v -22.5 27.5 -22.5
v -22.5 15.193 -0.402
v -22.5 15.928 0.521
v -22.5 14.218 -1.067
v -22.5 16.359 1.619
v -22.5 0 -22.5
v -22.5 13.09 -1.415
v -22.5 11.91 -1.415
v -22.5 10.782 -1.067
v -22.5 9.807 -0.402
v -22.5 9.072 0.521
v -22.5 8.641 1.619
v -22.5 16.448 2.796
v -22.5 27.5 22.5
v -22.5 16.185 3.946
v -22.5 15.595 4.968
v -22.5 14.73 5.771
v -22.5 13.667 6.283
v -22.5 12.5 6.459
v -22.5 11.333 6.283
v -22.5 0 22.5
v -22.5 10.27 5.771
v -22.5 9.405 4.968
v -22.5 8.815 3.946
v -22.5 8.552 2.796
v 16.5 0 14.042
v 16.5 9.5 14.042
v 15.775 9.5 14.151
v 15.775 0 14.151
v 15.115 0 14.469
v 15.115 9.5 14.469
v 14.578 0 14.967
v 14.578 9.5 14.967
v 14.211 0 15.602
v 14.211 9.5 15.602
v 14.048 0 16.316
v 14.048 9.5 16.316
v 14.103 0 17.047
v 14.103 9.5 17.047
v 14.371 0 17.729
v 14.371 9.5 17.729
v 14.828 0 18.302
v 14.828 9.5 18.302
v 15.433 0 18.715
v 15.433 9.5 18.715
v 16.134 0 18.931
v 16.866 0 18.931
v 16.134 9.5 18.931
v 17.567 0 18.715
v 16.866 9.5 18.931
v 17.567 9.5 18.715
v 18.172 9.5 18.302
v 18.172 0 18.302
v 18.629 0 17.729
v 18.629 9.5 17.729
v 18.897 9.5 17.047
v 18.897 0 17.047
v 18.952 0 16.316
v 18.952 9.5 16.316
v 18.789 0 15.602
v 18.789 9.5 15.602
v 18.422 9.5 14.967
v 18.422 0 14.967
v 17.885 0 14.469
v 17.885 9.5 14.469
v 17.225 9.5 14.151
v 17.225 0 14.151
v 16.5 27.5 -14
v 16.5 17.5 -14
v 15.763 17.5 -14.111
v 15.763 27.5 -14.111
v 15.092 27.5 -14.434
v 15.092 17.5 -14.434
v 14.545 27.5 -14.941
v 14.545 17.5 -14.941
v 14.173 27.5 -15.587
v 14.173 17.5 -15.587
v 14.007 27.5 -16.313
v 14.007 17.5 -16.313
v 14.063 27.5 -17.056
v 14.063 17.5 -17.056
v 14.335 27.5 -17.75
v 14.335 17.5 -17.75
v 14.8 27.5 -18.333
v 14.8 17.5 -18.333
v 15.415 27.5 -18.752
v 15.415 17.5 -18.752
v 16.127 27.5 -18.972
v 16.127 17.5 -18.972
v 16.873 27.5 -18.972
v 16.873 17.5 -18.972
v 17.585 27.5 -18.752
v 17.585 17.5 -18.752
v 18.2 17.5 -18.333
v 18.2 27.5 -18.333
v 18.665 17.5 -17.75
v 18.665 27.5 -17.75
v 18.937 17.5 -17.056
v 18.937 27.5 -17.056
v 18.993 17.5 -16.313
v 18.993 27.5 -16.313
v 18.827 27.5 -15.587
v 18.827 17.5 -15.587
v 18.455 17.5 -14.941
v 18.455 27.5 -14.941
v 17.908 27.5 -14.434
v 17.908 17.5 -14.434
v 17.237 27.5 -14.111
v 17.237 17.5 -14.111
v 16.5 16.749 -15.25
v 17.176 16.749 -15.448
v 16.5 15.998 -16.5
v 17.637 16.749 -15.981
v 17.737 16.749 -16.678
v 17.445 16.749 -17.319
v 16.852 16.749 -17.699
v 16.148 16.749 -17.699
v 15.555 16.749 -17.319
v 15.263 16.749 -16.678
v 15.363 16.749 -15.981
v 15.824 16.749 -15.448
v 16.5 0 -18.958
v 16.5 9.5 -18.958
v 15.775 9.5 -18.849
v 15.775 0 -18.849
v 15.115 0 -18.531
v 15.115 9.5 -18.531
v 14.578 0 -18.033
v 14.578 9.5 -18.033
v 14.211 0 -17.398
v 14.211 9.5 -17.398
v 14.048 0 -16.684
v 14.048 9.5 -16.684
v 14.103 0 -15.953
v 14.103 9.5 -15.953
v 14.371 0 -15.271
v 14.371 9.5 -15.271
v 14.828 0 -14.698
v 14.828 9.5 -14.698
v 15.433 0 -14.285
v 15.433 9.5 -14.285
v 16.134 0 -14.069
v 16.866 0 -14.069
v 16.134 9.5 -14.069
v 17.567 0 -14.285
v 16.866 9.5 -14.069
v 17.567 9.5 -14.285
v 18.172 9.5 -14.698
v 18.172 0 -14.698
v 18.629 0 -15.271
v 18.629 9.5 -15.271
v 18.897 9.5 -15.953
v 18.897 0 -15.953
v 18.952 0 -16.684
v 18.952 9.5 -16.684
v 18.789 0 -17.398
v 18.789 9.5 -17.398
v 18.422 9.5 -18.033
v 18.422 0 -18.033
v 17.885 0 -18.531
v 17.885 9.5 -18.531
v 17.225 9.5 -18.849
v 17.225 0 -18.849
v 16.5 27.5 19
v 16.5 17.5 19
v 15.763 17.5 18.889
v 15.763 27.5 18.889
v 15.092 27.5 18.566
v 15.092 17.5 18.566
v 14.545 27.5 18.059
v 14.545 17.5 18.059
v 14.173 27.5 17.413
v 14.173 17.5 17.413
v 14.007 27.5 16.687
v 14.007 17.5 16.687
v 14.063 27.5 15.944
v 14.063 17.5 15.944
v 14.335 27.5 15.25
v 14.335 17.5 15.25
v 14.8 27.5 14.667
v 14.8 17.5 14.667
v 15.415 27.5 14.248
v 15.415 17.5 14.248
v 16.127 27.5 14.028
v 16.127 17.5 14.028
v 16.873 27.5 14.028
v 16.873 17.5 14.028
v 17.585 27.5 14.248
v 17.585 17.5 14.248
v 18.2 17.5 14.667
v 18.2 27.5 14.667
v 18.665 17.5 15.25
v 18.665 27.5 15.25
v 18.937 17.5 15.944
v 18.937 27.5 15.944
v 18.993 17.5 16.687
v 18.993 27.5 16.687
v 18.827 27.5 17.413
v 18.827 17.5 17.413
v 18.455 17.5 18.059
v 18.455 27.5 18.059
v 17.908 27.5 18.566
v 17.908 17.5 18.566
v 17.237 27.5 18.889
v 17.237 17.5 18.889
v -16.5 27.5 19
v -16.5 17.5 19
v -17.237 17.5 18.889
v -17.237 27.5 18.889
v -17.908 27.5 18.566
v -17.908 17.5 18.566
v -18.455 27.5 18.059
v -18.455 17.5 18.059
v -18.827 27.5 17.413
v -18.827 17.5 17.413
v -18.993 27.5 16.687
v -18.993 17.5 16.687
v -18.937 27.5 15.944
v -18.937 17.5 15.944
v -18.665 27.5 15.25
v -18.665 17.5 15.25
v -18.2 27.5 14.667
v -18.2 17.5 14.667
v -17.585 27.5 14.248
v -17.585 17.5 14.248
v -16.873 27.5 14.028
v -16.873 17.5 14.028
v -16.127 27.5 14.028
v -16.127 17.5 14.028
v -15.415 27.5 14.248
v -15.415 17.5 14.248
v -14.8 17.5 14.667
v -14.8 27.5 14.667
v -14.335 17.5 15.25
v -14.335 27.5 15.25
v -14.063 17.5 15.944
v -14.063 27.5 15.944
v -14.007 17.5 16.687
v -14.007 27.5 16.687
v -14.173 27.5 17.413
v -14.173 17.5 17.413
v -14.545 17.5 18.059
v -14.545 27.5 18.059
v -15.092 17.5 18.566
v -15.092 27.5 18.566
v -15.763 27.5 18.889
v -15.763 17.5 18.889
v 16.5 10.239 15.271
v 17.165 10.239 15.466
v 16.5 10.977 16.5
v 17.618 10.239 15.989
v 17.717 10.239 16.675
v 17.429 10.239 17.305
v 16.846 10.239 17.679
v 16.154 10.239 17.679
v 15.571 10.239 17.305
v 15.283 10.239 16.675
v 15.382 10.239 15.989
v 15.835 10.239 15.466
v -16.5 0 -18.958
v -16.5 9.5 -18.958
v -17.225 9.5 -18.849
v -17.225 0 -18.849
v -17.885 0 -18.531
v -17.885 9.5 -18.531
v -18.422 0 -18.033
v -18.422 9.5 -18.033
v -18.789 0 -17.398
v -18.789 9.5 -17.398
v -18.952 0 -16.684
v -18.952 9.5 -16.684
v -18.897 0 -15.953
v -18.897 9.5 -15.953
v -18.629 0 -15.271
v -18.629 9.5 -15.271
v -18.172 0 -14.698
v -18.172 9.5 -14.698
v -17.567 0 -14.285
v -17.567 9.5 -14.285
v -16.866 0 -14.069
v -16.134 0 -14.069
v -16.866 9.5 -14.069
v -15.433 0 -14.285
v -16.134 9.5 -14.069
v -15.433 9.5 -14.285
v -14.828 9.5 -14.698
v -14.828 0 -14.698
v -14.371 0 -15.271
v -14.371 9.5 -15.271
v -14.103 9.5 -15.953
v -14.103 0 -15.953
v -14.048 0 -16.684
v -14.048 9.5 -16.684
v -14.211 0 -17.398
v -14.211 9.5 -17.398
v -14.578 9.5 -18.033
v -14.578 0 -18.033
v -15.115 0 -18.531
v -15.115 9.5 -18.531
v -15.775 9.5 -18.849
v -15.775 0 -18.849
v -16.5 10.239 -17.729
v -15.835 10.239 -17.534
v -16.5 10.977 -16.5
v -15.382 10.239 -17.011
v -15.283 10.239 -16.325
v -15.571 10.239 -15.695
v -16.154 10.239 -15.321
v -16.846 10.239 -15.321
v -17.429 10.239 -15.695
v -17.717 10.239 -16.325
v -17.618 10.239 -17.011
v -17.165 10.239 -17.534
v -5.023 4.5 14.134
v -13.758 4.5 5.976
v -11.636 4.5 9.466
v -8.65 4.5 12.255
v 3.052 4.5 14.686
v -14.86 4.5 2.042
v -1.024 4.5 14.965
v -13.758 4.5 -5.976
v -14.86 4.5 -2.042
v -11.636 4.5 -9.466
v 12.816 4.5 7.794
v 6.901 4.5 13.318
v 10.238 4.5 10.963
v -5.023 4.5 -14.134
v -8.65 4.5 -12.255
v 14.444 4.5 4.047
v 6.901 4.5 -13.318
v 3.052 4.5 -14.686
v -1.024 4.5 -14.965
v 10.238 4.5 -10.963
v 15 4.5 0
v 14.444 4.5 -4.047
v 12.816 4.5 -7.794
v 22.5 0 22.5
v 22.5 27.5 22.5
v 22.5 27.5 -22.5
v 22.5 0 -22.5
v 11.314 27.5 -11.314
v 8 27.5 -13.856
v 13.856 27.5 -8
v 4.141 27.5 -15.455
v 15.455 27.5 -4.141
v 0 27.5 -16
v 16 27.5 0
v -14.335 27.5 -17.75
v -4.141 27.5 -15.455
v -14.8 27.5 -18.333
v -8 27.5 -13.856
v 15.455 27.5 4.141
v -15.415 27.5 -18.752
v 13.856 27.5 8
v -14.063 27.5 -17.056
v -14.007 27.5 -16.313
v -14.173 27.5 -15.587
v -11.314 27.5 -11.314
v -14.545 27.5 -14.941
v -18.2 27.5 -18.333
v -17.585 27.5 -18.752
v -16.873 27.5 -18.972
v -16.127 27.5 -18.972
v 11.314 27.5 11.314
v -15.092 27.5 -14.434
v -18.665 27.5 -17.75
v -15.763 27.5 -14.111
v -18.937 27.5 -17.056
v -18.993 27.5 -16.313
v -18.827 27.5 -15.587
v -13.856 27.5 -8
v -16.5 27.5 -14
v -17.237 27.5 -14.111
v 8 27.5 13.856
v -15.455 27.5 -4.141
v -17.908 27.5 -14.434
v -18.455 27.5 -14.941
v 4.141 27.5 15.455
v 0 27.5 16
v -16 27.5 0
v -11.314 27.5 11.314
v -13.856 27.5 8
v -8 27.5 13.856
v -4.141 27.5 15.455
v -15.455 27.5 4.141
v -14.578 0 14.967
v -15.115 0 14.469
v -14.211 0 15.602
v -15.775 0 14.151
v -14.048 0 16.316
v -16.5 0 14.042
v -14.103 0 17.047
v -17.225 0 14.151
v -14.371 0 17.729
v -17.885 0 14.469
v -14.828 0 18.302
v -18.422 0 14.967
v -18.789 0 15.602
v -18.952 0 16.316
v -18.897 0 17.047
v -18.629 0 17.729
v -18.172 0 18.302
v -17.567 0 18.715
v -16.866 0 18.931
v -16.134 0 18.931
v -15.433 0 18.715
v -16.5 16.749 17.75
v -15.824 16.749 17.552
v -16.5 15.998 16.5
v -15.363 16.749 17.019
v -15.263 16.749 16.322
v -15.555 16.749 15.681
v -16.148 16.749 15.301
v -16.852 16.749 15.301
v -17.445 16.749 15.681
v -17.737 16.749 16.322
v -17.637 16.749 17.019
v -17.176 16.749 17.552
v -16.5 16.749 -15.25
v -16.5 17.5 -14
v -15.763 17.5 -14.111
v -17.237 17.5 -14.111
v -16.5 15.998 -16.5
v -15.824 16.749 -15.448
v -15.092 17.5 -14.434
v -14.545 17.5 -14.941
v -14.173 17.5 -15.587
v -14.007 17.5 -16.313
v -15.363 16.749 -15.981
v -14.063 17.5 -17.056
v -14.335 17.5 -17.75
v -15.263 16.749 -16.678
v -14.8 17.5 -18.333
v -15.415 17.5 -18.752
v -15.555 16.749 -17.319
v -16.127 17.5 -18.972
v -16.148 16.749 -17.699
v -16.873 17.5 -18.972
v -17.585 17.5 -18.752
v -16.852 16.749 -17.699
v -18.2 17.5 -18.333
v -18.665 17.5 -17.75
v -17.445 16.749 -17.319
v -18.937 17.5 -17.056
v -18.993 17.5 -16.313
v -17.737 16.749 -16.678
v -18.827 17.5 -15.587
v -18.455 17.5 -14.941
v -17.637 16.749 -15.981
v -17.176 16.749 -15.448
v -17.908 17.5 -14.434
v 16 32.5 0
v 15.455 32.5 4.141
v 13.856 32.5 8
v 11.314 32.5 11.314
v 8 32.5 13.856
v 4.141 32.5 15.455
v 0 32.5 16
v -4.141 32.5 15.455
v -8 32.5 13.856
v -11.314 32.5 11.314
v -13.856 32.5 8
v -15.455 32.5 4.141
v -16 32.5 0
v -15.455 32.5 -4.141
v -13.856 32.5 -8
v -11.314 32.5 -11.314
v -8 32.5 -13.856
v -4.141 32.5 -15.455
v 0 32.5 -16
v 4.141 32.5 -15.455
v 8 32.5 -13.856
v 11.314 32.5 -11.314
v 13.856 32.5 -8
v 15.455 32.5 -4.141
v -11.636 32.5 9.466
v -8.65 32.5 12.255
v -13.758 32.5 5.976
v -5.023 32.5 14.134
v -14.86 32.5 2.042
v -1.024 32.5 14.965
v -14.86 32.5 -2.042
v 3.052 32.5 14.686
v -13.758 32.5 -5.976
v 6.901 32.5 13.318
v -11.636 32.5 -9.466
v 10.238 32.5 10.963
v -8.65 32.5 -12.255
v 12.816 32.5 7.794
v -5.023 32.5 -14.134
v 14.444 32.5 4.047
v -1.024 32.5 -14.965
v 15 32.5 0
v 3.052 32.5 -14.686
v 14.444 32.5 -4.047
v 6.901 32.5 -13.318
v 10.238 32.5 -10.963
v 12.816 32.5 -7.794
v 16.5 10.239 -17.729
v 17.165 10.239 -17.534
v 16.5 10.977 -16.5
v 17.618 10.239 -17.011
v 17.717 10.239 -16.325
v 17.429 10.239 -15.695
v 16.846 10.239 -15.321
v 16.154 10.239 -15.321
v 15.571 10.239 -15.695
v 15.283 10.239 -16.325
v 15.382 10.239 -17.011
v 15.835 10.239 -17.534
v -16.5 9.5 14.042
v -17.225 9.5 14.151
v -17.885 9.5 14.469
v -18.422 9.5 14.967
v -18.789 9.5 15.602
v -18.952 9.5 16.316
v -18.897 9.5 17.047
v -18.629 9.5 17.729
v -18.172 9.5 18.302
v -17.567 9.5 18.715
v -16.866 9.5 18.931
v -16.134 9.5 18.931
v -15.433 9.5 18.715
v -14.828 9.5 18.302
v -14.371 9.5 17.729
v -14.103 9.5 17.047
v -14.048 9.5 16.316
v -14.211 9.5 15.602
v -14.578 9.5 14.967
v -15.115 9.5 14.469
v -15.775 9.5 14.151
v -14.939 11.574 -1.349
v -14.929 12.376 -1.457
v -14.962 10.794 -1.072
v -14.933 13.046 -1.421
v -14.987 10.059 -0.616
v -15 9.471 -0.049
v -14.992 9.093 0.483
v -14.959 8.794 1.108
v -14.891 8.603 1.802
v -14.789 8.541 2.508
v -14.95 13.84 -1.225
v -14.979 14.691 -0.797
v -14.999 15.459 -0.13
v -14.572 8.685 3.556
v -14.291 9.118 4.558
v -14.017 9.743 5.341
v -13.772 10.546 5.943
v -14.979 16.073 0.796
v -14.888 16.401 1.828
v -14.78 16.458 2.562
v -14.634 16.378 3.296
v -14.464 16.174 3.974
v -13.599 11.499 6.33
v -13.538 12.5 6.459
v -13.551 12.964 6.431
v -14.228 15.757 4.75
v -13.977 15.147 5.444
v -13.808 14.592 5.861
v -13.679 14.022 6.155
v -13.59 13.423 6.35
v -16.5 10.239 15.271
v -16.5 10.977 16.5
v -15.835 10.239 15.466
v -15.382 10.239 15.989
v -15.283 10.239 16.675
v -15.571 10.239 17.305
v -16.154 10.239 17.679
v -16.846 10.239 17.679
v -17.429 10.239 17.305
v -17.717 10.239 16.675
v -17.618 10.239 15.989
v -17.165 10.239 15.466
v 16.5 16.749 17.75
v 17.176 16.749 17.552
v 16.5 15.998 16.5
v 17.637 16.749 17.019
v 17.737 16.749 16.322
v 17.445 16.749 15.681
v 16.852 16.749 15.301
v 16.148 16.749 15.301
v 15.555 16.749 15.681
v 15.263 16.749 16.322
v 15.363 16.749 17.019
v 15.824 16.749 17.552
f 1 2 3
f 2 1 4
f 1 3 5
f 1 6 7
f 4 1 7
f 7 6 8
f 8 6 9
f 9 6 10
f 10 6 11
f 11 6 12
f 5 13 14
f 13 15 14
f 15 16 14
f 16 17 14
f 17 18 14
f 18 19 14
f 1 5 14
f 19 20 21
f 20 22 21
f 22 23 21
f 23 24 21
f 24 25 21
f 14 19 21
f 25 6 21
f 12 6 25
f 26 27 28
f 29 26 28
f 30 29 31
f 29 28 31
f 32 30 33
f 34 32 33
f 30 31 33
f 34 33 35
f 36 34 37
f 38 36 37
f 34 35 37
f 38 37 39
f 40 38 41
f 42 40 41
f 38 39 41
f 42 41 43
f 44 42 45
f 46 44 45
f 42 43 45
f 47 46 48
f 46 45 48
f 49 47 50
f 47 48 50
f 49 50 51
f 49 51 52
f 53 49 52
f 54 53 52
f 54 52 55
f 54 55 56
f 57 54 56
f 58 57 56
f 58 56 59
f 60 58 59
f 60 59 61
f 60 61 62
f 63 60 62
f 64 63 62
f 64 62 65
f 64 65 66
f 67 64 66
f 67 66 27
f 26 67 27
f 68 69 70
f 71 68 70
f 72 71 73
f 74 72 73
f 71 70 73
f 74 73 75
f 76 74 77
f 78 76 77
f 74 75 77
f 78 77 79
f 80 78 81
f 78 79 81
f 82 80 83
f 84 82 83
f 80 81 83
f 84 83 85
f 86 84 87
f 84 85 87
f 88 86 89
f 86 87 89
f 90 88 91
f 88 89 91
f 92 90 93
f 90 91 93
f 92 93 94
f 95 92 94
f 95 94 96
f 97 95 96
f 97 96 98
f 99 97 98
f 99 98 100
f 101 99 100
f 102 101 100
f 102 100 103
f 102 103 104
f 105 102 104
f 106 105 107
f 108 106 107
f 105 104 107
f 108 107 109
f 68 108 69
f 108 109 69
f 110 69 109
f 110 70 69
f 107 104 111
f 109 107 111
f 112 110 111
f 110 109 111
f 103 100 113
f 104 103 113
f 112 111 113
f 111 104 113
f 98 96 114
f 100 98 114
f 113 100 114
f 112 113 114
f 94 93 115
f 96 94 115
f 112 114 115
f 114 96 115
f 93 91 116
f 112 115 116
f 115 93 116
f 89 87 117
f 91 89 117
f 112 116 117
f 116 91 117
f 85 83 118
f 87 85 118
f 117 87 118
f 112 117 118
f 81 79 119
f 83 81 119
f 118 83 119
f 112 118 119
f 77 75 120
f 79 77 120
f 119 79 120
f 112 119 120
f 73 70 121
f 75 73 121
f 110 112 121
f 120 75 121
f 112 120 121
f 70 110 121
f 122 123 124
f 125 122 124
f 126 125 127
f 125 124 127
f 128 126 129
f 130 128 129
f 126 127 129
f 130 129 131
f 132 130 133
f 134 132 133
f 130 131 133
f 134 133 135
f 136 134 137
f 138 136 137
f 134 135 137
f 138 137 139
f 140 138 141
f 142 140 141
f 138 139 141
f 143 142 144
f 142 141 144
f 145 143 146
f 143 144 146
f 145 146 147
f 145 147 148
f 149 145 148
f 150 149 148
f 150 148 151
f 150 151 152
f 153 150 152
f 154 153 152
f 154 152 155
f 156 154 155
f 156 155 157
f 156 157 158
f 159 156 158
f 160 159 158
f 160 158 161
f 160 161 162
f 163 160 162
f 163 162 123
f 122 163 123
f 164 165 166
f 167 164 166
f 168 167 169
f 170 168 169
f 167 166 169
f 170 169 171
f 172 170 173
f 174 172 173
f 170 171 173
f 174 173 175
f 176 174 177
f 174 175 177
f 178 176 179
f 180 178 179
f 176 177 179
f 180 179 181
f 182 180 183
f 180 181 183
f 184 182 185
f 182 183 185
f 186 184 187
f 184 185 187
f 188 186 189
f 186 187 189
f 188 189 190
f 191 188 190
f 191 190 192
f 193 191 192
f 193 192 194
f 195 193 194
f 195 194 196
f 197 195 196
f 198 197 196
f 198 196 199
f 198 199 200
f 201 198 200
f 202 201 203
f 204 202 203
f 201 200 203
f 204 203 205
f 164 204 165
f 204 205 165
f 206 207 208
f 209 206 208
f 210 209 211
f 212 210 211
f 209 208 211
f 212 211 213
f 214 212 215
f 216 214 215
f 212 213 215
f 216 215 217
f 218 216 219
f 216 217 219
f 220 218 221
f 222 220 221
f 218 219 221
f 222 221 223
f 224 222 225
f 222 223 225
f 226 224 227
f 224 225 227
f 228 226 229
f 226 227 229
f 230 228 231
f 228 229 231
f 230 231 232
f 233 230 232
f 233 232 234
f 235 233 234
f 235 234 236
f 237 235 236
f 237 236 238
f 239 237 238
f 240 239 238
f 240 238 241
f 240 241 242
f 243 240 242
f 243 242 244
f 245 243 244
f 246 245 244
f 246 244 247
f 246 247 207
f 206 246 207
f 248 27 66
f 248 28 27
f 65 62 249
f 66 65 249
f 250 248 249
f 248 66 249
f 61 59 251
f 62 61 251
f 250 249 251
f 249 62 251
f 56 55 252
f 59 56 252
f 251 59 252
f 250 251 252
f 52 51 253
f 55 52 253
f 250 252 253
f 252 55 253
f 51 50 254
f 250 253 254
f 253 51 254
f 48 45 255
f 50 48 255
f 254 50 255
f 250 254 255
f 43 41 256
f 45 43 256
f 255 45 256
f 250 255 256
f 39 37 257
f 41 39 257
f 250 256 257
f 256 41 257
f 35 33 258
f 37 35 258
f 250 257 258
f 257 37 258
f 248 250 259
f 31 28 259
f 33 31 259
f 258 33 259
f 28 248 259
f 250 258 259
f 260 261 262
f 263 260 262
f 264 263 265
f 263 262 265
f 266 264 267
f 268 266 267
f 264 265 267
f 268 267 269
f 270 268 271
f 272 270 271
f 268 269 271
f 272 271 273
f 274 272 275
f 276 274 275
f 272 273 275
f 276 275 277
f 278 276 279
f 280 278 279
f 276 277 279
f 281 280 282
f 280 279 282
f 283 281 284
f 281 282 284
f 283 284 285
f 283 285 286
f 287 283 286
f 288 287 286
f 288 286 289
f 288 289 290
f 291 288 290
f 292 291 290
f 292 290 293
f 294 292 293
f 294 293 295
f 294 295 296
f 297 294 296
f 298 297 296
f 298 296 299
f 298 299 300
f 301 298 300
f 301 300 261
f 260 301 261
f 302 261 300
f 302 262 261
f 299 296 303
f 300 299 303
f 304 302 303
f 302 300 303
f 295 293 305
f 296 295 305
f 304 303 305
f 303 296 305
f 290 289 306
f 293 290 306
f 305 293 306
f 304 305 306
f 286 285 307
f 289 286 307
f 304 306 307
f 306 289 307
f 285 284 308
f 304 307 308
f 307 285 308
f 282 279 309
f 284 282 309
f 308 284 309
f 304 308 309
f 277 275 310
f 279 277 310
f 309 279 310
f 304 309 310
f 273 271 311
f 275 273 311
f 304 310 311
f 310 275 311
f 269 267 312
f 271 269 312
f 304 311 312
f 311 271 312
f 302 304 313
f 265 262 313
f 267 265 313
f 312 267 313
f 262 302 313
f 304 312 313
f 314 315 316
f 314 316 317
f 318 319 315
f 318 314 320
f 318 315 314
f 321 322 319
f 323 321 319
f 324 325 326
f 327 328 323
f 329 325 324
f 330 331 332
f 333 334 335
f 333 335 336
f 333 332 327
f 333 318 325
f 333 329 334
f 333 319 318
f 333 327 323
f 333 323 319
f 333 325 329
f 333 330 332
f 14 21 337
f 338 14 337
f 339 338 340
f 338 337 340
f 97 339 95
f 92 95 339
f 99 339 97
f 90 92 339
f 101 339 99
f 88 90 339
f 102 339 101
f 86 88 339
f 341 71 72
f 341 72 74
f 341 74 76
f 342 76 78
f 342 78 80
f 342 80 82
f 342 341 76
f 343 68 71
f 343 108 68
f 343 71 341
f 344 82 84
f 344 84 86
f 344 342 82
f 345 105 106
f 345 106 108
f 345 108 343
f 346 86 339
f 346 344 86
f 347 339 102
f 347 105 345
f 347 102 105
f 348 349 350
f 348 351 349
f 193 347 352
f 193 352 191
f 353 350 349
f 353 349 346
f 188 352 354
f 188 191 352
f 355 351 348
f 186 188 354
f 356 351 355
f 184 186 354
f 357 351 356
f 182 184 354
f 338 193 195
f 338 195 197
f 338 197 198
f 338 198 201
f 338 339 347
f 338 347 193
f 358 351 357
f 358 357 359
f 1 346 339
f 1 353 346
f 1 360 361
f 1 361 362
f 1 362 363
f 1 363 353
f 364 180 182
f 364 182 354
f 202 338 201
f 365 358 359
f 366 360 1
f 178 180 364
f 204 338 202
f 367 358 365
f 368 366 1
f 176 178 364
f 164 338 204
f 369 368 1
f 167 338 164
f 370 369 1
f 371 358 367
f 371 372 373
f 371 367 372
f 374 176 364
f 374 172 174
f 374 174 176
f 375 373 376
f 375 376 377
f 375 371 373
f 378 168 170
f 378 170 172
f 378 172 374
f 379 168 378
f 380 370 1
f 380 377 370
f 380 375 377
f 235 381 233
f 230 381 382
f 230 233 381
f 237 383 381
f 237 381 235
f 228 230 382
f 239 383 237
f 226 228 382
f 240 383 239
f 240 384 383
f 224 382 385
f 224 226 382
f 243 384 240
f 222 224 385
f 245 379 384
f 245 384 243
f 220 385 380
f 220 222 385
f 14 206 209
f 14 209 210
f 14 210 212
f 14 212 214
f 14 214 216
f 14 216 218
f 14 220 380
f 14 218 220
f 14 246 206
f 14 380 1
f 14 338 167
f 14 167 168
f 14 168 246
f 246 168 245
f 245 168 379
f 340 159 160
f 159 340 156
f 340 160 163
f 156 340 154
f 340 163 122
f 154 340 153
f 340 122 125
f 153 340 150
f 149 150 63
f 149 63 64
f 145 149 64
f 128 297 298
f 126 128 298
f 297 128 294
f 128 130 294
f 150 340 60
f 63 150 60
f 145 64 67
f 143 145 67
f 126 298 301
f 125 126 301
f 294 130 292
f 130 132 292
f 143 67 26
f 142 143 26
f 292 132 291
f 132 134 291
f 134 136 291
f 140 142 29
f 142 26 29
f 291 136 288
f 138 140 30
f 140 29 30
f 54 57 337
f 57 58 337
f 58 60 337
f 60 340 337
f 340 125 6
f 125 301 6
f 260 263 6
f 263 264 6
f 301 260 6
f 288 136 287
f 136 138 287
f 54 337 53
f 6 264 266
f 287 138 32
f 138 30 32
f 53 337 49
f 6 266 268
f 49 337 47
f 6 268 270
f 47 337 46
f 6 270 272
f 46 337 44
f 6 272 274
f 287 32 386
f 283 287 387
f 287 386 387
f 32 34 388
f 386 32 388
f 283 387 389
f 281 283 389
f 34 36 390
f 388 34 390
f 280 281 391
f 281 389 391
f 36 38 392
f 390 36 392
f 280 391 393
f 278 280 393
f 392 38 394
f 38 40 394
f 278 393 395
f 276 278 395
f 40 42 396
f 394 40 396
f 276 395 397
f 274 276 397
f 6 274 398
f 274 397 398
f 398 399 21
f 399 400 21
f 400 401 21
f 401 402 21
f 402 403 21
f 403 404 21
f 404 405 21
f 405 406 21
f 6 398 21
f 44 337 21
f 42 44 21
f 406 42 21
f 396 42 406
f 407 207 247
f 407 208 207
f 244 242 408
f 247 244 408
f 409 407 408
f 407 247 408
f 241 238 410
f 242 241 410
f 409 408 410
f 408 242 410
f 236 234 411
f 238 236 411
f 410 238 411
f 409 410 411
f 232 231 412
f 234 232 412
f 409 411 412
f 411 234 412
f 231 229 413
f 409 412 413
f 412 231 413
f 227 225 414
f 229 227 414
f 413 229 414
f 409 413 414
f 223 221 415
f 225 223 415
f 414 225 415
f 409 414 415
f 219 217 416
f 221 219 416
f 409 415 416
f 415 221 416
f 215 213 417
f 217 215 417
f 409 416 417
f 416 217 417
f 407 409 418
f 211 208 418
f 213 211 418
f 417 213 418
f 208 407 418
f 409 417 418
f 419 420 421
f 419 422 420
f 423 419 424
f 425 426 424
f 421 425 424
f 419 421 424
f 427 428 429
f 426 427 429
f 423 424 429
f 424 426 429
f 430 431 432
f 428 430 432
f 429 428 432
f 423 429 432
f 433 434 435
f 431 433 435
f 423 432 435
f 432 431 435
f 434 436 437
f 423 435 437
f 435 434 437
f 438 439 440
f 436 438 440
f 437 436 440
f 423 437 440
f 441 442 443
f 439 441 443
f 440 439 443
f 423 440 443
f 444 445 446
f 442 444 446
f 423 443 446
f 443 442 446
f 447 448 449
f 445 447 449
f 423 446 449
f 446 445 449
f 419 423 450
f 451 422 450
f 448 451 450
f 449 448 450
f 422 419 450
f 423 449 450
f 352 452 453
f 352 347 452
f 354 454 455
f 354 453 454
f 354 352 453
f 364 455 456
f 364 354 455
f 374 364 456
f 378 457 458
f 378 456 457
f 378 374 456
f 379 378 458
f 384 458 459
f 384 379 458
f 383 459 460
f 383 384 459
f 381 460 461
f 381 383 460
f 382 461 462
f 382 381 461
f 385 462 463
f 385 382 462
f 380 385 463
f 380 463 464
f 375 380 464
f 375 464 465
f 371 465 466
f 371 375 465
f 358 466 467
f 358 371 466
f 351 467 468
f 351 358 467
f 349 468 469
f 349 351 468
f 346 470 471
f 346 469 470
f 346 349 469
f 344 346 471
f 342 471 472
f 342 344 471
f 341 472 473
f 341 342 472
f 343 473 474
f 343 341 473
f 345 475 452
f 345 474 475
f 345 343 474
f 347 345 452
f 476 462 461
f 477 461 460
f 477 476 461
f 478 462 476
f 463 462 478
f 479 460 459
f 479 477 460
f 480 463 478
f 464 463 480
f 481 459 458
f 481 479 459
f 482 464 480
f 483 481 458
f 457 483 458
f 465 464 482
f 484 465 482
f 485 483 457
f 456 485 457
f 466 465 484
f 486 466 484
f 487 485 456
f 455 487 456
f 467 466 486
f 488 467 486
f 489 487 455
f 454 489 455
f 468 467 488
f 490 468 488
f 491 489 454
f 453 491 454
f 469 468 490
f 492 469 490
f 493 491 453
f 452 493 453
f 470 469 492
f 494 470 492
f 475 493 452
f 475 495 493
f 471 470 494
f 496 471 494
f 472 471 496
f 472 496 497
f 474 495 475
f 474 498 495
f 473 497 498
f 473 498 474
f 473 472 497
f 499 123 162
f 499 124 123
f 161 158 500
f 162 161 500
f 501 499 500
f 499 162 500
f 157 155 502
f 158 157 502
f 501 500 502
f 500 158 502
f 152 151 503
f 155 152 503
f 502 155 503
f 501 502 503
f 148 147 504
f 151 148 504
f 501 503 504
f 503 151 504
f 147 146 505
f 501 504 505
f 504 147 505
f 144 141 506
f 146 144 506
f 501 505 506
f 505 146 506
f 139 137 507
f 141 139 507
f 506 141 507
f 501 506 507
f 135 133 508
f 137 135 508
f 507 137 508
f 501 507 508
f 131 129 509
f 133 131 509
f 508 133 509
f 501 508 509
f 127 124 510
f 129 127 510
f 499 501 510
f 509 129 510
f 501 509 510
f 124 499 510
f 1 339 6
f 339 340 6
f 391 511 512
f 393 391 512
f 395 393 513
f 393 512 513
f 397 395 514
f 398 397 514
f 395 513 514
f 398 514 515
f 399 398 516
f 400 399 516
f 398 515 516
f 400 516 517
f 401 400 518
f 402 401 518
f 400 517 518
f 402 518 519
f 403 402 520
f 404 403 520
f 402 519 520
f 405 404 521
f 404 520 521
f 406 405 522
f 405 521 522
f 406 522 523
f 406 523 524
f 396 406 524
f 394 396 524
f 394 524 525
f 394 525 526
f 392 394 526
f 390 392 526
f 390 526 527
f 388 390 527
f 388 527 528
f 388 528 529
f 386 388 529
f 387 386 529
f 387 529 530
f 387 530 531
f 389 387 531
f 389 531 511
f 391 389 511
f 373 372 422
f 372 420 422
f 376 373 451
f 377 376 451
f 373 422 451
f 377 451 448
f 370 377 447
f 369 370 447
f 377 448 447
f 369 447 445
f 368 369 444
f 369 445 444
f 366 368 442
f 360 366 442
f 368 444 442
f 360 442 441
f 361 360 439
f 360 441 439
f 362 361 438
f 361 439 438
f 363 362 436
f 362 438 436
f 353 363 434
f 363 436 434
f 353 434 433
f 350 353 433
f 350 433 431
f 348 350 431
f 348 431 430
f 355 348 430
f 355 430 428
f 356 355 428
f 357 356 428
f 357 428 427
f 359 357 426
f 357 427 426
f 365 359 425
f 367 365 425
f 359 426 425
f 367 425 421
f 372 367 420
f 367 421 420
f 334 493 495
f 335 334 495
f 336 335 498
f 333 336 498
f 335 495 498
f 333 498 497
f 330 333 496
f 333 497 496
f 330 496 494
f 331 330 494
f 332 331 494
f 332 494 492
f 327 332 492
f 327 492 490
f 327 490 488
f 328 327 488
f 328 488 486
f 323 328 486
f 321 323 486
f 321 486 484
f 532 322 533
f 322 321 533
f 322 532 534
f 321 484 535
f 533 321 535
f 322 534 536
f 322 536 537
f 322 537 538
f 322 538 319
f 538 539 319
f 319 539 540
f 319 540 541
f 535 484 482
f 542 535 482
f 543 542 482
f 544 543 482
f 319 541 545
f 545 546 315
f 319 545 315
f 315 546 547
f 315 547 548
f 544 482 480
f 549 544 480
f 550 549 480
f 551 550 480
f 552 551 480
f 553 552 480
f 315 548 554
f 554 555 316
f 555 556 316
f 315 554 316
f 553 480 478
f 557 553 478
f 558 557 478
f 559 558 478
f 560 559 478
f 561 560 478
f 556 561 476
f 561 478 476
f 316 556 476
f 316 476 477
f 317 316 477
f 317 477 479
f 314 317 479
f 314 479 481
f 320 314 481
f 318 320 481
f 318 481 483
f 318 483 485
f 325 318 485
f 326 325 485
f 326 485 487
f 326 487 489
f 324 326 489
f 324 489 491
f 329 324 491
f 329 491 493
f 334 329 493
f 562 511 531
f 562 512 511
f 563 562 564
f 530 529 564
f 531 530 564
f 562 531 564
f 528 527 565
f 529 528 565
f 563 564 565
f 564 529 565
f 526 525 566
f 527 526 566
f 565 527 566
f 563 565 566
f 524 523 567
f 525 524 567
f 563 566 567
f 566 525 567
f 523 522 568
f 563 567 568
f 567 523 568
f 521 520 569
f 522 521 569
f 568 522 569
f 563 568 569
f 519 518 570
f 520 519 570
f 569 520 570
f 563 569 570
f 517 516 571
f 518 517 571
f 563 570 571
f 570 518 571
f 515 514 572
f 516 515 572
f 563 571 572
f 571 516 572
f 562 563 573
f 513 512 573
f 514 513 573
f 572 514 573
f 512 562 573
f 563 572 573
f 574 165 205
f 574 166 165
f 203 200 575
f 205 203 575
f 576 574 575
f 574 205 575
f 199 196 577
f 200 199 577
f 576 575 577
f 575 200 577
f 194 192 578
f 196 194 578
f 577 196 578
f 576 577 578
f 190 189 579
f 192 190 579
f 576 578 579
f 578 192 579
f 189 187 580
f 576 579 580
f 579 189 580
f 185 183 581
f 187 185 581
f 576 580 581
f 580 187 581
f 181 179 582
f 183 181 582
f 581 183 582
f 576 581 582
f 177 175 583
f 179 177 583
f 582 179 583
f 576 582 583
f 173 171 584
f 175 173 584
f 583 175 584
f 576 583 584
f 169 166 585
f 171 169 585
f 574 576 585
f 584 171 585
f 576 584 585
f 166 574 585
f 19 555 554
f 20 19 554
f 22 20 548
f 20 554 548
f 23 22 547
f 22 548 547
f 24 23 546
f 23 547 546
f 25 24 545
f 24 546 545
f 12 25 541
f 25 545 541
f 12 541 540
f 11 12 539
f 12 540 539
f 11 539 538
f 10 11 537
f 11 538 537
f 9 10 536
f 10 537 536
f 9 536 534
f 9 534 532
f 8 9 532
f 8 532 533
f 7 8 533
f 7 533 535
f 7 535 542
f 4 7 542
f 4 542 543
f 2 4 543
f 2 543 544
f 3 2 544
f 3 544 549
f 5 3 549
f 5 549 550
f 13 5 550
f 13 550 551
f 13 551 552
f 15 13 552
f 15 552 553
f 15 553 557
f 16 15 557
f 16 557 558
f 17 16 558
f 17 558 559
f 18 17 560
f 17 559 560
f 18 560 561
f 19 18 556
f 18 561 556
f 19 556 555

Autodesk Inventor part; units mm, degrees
ref_plane "YZ Plane" through (0, 0, 0) normal (1, 0, 0) x (0, 1, 0)
ref_plane "XZ Plane" through (0, 0, 0) normal (0, 1, 0) x (-1, 0, 0)
ref_plane "XY Plane" through (0, 0, 0) normal (0, 0, 1) x (1, 0, 0)
sketch "Sketch1" plane through (0, 0, 0) normal (0, 1, 0) x (-1, 0, 0)
  line L0 (22.5, 22.5) -> (-22.5, 22.5)
  line L1 (-22.5, 22.5) -> (-22.5, -22.5)
  line L2 (-22.5, -22.5) -> (22.5, -22.5)
  line L3 (22.5, -22.5) -> (22.5, 22.5)
  line L4 (22.5, 22.5) -> (-22.5, -22.5) construction
  line L5 (-22.5, 22.5) -> (22.5, -22.5) construction
  point P0 (0, 0)
  dimension "d0" = 45
  dimension "d1" = 45
extrude "Extrusion1" add sketch "Sketch1" along normal blind 27.5
sketch "Sketch2" plane through (0, 27.5, 0) normal (0, 1, 0) x (1, 0, 0)
  circle A0 centre (0, 0) radius 16
  dimension "d4" = 32
extrude "Extrusion2" add sketch "Sketch2" along normal blind 5
sketch "Sketch4" plane through (0, 0, 0) normal (0, -1, 0) x (1, 0, 0)
  point P0 (0, 0)
  point P1 (16.5, -16.5)
  point P2 (-16.5, -16.5)
  point P3 (-16.5, 16.5)
  point P4 (16.5, 16.5)
  dimension "d8" = 33
  dimension "d9" = 16.5
  dimension "d10" = 33
  dimension "d11" = 16.5
hole "Hole1" at (16.5, 0, -16.5) at (-16.5, 0, -16.5) at (-16.5, 0, 16.5) at (16.5, 0, 16.5) direction (0, 1, 0) diameter 4.917 depth 9.5 tip angle 118 thread size "M6x1" class "6H" standard "ISO Metric profile"
sketch "Sketch3" plane through (0, 32.5, 0) normal (0, 1, 0) x (1, 0, 0)
  circle A0 centre (0, 0) radius 15
  dimension "d7" = 30
extrude "Extrusion3" cut sketch "Sketch3" against normal blind 28
sketch "Sketch5" plane through (0, 27.5, 0) normal (0, 1, 0) x (1, 0, 0)
  circle A0 centre (16.5, 16.5) radius 2.4585 projected
  circle A1 centre (16.5, -16.5) radius 2.4585 projected
  circle A2 centre (-16.5, -16.5) radius 2.4585 projected
  circle A3 centre (-16.5, 16.5) radius 2.4585 projected
  point P0 (0, 0)
hole "Hole2" at (16.5, 27.5, -16.5) at (16.5, 27.5, 16.5) at (-16.5, 27.5, 16.5) at (-16.5, 27.5, -16.5) direction (0, -1, 0) diameter 5 depth 10 tip angle 118
sketch "Sketch6" plane through (-22.5, 0, -22.5) normal (-1, 0, 0) x (0, 0, 1)
  line L0 (45, 0) -> (45, 27.5) projected
  line L1 (0, 27.5) -> (45, 27.5) projected
  point P0 (22.5, 0)
  point P1 (25, 12.5)
  dimension "d28" = 20
  dimension "d29" = 15
hole "Hole3" at (-22.5, 12.5, 2.5) direction (1, 0, 0) diameter 7.9175 depth 27.5375 tip angle 118 thread size "M9x1" class "6H" standard "ISO Metric profile"
equation "\"d11\" = d9"
properties part number "2309HCMUTE-CDT23-NAP_DUOI"
